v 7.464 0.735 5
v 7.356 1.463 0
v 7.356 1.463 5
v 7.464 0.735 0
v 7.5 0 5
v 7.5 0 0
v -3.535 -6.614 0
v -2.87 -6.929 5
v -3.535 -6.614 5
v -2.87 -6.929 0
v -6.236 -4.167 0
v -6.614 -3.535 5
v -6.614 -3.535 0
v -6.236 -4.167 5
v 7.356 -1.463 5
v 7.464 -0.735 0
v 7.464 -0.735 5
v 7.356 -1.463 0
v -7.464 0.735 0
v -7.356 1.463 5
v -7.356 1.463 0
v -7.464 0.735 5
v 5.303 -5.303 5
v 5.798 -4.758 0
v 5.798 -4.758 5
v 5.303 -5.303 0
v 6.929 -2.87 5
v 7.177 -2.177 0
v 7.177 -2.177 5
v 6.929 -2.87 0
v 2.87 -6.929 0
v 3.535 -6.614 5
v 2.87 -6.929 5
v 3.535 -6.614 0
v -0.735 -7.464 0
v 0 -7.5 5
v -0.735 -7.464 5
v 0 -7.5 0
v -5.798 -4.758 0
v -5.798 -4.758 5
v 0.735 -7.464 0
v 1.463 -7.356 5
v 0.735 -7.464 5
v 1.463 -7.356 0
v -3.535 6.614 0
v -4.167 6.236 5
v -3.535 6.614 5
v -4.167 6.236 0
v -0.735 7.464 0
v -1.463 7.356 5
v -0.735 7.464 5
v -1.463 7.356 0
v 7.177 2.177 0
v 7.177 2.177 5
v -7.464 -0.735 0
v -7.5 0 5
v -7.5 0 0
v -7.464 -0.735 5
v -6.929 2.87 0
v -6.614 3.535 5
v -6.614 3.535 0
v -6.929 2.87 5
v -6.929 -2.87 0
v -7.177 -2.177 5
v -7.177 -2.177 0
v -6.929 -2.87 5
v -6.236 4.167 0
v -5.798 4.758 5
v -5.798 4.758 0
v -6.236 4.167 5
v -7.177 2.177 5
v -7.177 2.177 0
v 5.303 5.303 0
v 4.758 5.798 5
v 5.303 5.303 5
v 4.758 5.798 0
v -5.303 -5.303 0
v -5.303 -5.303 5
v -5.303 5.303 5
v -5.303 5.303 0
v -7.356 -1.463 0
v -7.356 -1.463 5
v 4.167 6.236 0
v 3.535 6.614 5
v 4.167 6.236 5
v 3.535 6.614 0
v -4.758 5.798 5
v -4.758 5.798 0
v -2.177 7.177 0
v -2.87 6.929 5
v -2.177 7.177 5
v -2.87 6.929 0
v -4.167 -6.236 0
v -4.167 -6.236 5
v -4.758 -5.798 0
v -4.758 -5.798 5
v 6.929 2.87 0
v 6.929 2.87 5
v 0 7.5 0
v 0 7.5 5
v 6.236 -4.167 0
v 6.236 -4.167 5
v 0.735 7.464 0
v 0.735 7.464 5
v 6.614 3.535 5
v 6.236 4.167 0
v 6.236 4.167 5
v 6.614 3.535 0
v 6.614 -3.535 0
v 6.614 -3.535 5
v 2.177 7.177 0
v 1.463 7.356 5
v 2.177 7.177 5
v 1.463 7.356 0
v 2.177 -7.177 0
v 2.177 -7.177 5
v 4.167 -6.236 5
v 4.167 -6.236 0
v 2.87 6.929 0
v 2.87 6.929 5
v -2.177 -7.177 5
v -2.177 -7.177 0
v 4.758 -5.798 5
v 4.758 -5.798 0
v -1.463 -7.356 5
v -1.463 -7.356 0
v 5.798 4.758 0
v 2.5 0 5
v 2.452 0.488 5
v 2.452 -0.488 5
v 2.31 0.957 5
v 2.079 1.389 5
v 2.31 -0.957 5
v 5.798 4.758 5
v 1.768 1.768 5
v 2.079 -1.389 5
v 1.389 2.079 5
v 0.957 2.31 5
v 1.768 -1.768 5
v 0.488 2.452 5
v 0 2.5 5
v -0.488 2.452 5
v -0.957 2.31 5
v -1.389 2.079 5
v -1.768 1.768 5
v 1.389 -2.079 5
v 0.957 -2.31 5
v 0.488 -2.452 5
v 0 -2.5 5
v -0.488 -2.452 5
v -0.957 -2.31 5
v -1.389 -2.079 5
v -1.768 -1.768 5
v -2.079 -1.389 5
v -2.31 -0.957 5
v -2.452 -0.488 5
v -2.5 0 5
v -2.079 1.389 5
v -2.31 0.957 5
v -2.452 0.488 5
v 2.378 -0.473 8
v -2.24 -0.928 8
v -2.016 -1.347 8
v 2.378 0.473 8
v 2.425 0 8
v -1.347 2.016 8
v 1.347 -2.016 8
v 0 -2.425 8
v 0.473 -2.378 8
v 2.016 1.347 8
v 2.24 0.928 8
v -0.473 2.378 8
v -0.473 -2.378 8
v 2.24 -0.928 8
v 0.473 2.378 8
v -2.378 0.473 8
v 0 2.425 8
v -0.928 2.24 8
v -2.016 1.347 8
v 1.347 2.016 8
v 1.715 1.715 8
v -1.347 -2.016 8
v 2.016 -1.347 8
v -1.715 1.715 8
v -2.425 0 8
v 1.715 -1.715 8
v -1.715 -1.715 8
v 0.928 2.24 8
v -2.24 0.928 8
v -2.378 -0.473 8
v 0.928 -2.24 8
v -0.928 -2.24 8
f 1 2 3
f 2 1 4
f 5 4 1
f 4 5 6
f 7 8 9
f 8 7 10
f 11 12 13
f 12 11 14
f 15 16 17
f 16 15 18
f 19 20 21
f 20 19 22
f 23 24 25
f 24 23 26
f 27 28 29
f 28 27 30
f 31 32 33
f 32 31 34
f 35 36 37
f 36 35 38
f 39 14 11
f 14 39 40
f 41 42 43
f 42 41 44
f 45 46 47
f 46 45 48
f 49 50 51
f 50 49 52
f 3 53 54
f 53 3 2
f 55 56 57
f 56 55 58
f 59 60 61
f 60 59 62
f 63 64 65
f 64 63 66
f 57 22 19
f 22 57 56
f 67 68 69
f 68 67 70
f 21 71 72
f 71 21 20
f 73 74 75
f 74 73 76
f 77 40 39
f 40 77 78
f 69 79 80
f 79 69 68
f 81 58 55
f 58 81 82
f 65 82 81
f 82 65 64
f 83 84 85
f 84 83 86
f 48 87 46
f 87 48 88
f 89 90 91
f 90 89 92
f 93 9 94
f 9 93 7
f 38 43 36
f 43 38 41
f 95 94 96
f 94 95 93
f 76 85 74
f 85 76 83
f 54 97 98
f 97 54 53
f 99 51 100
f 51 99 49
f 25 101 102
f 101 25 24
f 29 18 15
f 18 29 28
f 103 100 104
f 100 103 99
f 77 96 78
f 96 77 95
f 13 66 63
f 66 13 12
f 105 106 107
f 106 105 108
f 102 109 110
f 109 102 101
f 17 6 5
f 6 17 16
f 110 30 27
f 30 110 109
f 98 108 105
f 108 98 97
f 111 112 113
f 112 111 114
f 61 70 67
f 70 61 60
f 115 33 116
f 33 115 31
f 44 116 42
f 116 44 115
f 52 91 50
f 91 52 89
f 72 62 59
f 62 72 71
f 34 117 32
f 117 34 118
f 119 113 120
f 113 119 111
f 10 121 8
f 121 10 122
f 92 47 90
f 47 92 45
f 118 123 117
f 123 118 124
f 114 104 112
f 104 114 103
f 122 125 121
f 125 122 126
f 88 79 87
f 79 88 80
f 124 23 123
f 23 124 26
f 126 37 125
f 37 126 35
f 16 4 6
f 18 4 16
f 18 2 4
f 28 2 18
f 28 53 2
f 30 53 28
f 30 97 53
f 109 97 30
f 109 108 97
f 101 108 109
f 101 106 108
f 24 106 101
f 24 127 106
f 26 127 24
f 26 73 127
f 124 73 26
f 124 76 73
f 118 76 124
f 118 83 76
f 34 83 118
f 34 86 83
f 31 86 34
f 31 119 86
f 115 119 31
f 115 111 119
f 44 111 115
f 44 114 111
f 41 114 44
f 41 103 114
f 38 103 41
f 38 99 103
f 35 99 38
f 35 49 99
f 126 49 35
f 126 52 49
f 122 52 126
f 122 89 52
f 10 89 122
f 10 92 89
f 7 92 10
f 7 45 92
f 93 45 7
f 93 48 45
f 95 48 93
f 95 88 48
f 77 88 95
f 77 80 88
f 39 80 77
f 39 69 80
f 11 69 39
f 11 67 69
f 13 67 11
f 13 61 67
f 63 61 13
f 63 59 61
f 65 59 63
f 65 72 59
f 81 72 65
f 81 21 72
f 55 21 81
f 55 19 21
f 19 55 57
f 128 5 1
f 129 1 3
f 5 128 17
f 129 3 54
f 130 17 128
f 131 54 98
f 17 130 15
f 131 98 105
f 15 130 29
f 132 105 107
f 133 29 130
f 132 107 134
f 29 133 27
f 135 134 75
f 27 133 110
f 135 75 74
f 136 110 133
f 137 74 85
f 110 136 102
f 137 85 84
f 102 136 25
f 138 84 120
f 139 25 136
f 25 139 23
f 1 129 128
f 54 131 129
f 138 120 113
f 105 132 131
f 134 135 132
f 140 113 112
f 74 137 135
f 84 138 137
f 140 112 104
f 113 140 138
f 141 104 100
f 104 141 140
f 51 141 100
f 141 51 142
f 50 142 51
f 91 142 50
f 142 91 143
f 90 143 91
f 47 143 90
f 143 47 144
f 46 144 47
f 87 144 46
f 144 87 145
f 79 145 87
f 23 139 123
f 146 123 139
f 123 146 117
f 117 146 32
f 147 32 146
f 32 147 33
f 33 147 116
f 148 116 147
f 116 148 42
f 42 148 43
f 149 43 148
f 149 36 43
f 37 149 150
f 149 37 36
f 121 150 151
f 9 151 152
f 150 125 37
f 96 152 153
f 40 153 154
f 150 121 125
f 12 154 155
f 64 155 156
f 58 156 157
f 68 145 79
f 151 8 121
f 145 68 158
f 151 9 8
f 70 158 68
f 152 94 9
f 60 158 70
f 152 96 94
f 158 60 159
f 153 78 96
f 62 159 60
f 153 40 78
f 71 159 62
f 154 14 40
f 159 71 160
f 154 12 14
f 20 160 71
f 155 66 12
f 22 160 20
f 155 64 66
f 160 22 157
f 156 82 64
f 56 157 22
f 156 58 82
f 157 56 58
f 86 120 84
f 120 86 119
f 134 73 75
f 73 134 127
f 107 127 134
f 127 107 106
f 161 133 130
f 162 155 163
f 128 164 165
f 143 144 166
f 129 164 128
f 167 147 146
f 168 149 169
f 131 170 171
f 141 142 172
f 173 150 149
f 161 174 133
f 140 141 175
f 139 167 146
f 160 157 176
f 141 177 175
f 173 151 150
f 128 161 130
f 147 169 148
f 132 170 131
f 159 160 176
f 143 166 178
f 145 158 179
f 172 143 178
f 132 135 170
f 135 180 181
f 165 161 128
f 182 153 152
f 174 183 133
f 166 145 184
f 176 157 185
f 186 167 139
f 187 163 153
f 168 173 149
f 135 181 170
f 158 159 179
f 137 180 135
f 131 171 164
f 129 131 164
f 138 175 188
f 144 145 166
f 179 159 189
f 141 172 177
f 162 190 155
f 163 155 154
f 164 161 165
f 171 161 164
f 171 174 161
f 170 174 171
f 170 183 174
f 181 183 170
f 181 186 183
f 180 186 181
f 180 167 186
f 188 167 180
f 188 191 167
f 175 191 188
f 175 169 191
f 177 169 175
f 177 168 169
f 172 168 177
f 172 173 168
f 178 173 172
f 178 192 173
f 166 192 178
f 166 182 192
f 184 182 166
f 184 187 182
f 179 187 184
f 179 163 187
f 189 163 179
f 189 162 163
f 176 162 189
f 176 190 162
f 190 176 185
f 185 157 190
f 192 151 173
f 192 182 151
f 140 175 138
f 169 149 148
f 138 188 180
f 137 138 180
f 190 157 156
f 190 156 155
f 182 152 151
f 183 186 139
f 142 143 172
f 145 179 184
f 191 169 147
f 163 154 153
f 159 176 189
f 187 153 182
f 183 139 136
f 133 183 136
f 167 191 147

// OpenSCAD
// file: microwave_MD12801_spacer.scad
//
// spare part for MEDION Microwave oven MD12801 
// rotating plate support, 3 instances needed
//
// Caution: PLA parts will not survive the grill function!
//
// Andreas Merz 01.01.2019, v0.2, GPL


module microwave_MD12801_spacer(h=3.8, w=5) {
    // h: height of spacer without center pole
    // w: diameter of center pole
    c=0.15;      // clearance - spiel in mm am oberen Ende
    union() {
      linear_extrude(height = h)    // spacer height
        circle(15/2, $fn=64);
      translate([0,0,h])   
        linear_extrude(height = 3, scale=(1-c/5))    // center pole
          circle(5/2, $fn=32);     
    }
}

//------------- Instances --------------------

microwave_MD12801_spacer(h=5);   // make it a bit higher than the original part
